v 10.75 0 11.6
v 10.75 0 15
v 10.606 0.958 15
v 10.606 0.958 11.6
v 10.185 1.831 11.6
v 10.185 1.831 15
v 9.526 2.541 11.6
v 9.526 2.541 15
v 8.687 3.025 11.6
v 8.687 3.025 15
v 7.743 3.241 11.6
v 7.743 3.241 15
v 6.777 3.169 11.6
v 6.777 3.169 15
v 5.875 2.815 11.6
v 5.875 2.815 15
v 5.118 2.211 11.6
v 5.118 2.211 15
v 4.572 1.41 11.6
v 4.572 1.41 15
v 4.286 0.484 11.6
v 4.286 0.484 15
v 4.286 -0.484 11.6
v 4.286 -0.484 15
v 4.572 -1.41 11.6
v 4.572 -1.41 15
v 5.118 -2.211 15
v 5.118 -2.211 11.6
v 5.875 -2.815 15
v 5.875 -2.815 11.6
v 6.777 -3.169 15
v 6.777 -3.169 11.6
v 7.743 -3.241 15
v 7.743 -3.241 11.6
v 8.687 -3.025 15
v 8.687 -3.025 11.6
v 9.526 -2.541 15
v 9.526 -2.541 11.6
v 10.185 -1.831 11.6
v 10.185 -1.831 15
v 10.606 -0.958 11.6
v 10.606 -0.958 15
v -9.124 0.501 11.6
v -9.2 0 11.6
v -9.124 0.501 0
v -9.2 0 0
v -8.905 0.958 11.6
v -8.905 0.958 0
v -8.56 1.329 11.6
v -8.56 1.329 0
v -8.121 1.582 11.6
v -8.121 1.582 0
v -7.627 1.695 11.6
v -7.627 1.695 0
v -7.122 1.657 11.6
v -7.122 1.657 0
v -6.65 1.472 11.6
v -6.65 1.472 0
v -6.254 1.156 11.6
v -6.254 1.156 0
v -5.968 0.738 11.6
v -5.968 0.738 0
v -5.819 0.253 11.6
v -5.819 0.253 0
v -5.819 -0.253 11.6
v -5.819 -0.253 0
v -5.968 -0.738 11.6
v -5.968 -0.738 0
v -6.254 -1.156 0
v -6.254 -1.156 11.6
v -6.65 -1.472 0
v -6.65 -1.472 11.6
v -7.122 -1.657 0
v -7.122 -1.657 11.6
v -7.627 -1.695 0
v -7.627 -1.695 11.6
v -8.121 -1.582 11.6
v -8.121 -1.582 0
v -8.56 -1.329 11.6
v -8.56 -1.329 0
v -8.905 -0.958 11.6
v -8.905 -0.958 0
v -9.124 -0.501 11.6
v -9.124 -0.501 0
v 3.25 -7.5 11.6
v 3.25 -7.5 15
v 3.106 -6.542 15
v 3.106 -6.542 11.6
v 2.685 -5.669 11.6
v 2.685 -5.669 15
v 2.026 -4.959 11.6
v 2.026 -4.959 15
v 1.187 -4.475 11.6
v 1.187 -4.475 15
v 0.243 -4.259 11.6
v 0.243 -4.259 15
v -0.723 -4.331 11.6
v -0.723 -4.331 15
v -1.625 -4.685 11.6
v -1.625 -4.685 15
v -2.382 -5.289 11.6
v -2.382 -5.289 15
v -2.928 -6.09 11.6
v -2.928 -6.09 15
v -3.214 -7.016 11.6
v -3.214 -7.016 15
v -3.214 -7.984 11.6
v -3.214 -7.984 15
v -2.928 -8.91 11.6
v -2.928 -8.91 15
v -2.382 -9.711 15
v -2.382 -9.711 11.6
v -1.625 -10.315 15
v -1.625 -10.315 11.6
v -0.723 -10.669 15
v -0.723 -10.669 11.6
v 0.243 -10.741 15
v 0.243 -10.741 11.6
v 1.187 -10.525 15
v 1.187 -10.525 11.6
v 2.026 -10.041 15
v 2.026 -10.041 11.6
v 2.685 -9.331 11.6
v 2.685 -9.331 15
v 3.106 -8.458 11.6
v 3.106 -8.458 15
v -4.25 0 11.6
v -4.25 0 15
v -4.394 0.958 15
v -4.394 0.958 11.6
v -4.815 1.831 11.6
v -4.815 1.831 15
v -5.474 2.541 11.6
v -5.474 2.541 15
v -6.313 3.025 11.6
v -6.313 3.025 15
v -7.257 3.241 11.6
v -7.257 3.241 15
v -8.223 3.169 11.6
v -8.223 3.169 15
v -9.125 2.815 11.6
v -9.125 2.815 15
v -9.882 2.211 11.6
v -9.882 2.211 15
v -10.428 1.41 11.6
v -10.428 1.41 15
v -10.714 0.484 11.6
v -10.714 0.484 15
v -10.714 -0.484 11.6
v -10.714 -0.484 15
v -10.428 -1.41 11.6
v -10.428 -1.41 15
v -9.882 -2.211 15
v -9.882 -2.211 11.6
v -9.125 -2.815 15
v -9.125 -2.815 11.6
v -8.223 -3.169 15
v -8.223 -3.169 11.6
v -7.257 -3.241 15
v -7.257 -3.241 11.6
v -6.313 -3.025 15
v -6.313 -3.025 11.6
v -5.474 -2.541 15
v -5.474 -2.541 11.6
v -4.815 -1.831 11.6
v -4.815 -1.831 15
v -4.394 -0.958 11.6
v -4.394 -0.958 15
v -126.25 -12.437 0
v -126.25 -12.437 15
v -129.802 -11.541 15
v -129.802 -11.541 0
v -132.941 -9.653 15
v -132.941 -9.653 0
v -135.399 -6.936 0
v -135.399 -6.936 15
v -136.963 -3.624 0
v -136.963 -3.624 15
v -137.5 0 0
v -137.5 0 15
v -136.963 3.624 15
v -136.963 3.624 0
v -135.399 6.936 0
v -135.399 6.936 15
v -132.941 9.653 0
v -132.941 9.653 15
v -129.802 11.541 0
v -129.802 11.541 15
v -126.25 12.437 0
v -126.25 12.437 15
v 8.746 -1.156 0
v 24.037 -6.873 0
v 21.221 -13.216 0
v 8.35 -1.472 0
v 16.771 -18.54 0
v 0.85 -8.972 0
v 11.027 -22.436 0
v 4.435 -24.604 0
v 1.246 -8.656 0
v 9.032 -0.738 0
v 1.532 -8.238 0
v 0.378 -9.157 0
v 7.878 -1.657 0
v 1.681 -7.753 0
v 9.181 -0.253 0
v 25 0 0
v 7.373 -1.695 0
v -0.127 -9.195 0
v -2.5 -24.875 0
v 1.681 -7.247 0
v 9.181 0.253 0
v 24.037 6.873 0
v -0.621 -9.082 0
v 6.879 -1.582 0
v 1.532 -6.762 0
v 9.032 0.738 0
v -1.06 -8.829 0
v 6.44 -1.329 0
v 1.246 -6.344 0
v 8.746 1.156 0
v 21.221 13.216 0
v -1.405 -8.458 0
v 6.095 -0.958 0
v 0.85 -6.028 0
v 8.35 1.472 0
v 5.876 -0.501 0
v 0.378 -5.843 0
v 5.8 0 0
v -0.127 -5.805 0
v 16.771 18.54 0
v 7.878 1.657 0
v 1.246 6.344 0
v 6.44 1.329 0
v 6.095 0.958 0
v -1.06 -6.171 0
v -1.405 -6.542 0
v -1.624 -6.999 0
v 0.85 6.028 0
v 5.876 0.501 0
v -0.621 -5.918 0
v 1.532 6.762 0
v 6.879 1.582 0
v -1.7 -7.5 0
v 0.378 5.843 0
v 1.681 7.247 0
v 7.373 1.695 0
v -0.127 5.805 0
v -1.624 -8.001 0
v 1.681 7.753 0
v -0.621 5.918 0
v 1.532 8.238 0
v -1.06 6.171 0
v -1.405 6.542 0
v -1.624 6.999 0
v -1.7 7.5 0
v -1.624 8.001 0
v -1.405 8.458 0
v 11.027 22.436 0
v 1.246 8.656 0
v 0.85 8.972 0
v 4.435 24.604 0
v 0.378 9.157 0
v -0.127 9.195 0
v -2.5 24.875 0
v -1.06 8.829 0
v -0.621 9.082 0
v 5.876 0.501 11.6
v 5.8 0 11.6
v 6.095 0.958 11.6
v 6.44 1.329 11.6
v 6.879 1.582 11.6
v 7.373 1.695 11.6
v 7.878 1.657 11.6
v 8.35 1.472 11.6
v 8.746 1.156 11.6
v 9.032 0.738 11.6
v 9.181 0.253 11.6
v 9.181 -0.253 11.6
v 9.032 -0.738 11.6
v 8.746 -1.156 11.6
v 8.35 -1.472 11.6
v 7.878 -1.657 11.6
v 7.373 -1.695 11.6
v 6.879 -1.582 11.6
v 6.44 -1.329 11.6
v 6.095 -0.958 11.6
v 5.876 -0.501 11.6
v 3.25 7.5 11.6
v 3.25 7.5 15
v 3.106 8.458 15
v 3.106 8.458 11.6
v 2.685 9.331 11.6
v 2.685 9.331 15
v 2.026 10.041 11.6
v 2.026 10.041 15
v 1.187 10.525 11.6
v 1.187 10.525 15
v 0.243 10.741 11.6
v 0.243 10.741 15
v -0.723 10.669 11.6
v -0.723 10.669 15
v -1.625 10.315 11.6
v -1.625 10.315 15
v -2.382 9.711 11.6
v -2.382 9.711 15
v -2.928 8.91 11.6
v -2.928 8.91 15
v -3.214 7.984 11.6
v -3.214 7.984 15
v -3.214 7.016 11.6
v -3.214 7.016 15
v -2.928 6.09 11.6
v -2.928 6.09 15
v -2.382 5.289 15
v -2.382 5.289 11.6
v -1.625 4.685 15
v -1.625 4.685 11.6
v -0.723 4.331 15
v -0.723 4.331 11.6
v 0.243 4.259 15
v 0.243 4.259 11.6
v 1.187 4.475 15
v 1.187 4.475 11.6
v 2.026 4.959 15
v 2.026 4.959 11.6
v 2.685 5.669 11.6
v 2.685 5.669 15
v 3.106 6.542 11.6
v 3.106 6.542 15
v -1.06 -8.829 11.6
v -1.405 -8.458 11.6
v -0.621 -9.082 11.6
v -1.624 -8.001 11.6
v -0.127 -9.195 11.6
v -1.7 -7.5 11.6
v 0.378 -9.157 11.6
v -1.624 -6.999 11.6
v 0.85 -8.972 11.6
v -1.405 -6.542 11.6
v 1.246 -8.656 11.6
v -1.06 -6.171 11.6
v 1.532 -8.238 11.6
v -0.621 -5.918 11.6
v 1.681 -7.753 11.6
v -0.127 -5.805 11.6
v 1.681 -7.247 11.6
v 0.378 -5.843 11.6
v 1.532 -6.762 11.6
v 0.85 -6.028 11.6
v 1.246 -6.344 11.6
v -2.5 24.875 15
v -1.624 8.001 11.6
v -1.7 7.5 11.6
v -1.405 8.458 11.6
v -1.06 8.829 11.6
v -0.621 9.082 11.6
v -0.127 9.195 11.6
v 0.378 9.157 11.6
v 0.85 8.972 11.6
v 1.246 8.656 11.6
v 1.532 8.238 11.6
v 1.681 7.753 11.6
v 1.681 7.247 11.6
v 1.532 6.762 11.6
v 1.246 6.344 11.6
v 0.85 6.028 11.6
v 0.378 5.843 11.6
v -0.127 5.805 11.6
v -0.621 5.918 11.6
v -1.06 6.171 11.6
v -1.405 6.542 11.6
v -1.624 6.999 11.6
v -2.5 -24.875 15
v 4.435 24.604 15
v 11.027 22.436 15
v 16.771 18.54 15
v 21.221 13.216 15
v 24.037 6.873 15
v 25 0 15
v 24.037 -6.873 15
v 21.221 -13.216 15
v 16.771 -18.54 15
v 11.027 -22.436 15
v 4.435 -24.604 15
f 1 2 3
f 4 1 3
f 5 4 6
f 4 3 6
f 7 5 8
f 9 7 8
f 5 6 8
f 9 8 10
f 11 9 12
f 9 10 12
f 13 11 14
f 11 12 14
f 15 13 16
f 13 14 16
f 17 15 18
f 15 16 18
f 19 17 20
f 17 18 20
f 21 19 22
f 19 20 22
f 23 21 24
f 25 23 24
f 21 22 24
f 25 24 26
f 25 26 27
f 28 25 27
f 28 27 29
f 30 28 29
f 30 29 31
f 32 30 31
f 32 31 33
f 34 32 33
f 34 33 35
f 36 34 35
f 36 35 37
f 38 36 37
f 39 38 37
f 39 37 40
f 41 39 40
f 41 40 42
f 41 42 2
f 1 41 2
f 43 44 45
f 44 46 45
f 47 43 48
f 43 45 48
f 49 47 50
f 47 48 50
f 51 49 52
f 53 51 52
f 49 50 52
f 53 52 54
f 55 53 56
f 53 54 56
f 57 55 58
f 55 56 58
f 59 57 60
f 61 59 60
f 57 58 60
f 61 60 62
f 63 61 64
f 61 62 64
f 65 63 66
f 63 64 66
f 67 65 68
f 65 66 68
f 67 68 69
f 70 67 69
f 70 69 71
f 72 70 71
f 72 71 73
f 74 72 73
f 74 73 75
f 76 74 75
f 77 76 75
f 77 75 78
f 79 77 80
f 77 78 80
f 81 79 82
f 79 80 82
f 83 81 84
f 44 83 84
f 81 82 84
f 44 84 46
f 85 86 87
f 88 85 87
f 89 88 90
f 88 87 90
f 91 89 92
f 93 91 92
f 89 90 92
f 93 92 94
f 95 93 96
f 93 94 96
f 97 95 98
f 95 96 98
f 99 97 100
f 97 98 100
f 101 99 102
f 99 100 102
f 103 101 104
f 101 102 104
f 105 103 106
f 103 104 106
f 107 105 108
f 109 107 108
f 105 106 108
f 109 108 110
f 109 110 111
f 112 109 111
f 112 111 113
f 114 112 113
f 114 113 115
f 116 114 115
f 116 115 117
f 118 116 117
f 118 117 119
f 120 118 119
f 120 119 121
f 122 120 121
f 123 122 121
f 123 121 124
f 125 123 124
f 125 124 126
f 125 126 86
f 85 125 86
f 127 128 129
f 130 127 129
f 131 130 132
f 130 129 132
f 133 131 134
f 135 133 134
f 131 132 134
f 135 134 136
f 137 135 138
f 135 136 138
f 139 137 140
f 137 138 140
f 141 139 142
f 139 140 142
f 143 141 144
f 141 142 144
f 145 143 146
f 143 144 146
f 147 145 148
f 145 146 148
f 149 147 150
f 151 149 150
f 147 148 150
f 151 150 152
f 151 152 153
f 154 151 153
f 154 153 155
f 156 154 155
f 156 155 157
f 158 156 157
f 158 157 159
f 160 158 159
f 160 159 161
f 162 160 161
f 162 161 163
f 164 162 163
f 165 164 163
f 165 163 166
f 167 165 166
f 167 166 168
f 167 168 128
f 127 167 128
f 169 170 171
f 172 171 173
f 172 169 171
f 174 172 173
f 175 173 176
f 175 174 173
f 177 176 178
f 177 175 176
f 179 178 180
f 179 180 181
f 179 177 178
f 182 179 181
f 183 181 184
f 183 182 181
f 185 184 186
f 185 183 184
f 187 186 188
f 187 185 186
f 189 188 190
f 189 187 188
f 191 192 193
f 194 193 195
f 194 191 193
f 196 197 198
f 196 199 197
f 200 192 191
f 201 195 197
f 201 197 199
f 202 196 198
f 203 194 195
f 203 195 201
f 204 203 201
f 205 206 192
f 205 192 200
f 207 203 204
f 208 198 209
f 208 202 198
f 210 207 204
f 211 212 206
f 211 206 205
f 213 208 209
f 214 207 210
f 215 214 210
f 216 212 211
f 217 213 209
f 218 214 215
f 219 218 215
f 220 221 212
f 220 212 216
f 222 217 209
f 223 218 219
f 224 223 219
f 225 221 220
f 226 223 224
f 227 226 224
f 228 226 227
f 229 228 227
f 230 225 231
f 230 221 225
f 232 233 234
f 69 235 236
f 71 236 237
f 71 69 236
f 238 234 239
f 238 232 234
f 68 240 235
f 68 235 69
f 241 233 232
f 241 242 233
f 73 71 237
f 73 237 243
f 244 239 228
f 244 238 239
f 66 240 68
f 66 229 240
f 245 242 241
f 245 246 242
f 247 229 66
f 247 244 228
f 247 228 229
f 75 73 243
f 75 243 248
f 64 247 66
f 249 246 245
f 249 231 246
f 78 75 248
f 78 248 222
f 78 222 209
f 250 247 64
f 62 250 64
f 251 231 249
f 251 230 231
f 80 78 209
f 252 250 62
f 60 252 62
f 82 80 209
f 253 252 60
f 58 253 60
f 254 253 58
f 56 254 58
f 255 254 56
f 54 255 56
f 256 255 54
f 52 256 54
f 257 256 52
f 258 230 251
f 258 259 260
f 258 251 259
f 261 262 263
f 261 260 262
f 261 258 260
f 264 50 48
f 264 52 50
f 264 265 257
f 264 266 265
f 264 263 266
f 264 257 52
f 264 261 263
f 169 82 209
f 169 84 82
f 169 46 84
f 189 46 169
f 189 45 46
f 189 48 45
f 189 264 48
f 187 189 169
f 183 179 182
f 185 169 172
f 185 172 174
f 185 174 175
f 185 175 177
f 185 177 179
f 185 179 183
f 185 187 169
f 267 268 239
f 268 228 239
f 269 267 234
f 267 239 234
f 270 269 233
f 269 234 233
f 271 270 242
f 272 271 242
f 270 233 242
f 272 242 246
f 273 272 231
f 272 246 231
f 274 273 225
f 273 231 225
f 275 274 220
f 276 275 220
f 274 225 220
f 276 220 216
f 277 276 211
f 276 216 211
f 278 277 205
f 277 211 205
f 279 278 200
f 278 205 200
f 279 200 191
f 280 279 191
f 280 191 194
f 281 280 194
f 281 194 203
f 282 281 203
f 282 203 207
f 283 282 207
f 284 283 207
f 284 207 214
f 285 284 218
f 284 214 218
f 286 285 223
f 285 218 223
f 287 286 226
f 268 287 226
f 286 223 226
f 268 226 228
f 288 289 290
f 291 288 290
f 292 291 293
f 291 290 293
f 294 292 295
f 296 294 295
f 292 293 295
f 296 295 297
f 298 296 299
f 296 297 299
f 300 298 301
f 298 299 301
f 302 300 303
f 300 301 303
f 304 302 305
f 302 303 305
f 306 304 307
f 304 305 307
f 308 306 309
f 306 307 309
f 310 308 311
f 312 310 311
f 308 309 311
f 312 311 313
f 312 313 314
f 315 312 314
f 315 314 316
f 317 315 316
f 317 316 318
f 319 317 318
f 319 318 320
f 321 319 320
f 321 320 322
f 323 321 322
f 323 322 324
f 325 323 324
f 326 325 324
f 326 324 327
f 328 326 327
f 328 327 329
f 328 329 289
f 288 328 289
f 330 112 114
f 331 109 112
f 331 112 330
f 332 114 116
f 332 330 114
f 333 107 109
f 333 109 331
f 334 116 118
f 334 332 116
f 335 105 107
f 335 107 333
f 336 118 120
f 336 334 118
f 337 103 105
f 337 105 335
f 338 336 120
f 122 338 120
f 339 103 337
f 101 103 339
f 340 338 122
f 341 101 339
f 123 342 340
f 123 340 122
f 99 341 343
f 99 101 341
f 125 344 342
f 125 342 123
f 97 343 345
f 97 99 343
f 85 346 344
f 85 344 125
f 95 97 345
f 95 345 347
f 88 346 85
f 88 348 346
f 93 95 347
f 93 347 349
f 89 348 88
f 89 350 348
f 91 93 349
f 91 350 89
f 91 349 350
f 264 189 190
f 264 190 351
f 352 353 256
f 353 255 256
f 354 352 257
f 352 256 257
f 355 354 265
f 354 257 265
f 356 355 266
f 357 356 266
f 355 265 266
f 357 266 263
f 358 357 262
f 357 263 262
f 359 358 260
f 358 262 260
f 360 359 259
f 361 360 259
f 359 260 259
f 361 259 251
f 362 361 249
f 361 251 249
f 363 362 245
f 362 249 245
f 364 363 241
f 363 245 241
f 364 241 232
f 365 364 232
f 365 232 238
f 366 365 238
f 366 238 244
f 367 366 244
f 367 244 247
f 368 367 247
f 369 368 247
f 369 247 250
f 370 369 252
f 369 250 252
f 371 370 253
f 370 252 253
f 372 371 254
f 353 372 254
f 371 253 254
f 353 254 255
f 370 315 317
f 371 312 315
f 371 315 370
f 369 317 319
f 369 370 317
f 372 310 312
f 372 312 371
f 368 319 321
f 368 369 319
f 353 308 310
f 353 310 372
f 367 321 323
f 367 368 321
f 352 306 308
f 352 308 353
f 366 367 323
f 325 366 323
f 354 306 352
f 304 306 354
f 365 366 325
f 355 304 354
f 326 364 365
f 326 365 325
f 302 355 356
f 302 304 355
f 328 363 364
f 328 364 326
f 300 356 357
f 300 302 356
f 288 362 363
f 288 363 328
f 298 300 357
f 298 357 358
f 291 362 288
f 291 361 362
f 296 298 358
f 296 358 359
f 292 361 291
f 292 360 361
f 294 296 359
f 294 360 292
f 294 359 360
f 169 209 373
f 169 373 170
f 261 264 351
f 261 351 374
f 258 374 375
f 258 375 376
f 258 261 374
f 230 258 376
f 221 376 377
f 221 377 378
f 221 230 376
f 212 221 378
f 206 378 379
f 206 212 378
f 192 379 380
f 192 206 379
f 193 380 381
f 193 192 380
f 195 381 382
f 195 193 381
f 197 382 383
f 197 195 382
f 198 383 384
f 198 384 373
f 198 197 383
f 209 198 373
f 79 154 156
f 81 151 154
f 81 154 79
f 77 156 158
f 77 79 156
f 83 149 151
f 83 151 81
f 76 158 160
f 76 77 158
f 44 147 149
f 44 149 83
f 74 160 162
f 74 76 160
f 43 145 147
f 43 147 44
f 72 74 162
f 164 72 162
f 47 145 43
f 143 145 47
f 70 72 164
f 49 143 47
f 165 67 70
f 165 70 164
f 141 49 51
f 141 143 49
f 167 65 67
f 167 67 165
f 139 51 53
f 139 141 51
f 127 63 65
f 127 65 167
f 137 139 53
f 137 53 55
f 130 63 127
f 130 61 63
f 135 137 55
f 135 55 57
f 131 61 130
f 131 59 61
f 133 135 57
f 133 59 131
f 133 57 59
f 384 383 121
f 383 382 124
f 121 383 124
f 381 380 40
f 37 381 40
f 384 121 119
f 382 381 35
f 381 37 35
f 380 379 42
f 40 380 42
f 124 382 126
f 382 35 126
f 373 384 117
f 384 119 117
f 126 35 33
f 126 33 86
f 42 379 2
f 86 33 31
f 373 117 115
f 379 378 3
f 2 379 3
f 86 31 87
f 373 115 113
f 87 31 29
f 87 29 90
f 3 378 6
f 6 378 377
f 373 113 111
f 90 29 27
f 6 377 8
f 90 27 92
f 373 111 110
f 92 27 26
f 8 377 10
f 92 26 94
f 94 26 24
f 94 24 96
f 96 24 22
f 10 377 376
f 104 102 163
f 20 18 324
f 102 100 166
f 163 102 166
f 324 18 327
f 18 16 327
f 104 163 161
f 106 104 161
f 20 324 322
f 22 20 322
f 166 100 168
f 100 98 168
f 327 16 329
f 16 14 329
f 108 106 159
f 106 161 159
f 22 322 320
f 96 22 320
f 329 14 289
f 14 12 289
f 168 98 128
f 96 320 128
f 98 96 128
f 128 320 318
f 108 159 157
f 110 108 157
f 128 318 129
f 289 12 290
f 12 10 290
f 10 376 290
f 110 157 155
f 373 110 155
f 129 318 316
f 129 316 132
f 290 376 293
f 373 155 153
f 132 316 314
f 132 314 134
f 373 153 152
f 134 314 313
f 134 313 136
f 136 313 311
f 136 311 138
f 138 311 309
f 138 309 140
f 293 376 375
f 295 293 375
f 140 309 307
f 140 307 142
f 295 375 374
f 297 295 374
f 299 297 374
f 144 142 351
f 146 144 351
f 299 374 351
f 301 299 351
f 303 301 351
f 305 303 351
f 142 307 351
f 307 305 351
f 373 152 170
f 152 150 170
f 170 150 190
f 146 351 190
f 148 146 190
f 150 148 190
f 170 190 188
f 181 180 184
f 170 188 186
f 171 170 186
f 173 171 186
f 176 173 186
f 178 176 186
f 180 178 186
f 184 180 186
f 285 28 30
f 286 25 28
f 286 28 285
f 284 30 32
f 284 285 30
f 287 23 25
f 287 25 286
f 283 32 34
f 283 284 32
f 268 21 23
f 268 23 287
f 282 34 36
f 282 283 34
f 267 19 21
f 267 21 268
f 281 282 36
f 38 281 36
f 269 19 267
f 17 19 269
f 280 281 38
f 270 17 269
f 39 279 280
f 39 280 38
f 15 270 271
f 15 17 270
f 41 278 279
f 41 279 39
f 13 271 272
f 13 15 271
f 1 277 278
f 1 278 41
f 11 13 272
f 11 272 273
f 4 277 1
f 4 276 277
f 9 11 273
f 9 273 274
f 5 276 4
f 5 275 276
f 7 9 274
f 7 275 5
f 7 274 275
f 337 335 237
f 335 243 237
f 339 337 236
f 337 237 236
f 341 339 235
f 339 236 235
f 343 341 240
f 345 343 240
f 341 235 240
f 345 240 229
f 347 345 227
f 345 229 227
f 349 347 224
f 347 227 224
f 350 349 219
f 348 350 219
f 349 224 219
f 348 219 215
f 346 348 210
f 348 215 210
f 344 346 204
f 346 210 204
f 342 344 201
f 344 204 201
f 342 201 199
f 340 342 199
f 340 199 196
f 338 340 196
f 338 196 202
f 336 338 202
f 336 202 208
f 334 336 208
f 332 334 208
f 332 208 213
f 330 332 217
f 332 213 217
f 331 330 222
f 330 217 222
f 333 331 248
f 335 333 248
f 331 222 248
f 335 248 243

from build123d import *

# Parameters (mm, degrees)
BOSS_EXTRUDE1_DEPTH                                 = 15
CBORE_FOR_M3_HEX_SOCKET_HEAD_CAP_SCREW1_D           = 3.4
CBORE_FOR_M3_HEX_SOCKET_HEAD_CAP_SCREW1_CBORE_D     = 6.5
CBORE_FOR_M3_HEX_SOCKET_HEAD_CAP_SCREW1_CBORE_DEPTH = 3.4


with BuildPart() as part:
    # Sketch1 → Boss-Extrude1 (new body)
    with BuildSketch(Plane.XY):
        with BuildLine():
            Line((-126.25, 12.437342964), (-2.5, 24.874685928))
            ThreePointArc((-2.5, 24.874685928), (25, 0), (-2.5, -24.874685928))
            Line((-2.5, -24.874685928), (-126.25, -12.437342964))
            ThreePointArc((-126.25, -12.437342964), (-137.5, 0), (-126.25, 12.437342964))
        make_face()
    extrude(amount=BOSS_EXTRUDE1_DEPTH)

    # CBORE for M3 Hex Socket Head Cap Screw1 (through all)
    with Locations(Plane.XY.offset(15)):
        with Locations((0, 7.5), (7.5, 0), (0, -7.5), (-7.5, 0)):
            CounterBoreHole(CBORE_FOR_M3_HEX_SOCKET_HEAD_CAP_SCREW1_D / 2, CBORE_FOR_M3_HEX_SOCKET_HEAD_CAP_SCREW1_CBORE_D / 2, CBORE_FOR_M3_HEX_SOCKET_HEAD_CAP_SCREW1_CBORE_DEPTH)


solid = part.part
